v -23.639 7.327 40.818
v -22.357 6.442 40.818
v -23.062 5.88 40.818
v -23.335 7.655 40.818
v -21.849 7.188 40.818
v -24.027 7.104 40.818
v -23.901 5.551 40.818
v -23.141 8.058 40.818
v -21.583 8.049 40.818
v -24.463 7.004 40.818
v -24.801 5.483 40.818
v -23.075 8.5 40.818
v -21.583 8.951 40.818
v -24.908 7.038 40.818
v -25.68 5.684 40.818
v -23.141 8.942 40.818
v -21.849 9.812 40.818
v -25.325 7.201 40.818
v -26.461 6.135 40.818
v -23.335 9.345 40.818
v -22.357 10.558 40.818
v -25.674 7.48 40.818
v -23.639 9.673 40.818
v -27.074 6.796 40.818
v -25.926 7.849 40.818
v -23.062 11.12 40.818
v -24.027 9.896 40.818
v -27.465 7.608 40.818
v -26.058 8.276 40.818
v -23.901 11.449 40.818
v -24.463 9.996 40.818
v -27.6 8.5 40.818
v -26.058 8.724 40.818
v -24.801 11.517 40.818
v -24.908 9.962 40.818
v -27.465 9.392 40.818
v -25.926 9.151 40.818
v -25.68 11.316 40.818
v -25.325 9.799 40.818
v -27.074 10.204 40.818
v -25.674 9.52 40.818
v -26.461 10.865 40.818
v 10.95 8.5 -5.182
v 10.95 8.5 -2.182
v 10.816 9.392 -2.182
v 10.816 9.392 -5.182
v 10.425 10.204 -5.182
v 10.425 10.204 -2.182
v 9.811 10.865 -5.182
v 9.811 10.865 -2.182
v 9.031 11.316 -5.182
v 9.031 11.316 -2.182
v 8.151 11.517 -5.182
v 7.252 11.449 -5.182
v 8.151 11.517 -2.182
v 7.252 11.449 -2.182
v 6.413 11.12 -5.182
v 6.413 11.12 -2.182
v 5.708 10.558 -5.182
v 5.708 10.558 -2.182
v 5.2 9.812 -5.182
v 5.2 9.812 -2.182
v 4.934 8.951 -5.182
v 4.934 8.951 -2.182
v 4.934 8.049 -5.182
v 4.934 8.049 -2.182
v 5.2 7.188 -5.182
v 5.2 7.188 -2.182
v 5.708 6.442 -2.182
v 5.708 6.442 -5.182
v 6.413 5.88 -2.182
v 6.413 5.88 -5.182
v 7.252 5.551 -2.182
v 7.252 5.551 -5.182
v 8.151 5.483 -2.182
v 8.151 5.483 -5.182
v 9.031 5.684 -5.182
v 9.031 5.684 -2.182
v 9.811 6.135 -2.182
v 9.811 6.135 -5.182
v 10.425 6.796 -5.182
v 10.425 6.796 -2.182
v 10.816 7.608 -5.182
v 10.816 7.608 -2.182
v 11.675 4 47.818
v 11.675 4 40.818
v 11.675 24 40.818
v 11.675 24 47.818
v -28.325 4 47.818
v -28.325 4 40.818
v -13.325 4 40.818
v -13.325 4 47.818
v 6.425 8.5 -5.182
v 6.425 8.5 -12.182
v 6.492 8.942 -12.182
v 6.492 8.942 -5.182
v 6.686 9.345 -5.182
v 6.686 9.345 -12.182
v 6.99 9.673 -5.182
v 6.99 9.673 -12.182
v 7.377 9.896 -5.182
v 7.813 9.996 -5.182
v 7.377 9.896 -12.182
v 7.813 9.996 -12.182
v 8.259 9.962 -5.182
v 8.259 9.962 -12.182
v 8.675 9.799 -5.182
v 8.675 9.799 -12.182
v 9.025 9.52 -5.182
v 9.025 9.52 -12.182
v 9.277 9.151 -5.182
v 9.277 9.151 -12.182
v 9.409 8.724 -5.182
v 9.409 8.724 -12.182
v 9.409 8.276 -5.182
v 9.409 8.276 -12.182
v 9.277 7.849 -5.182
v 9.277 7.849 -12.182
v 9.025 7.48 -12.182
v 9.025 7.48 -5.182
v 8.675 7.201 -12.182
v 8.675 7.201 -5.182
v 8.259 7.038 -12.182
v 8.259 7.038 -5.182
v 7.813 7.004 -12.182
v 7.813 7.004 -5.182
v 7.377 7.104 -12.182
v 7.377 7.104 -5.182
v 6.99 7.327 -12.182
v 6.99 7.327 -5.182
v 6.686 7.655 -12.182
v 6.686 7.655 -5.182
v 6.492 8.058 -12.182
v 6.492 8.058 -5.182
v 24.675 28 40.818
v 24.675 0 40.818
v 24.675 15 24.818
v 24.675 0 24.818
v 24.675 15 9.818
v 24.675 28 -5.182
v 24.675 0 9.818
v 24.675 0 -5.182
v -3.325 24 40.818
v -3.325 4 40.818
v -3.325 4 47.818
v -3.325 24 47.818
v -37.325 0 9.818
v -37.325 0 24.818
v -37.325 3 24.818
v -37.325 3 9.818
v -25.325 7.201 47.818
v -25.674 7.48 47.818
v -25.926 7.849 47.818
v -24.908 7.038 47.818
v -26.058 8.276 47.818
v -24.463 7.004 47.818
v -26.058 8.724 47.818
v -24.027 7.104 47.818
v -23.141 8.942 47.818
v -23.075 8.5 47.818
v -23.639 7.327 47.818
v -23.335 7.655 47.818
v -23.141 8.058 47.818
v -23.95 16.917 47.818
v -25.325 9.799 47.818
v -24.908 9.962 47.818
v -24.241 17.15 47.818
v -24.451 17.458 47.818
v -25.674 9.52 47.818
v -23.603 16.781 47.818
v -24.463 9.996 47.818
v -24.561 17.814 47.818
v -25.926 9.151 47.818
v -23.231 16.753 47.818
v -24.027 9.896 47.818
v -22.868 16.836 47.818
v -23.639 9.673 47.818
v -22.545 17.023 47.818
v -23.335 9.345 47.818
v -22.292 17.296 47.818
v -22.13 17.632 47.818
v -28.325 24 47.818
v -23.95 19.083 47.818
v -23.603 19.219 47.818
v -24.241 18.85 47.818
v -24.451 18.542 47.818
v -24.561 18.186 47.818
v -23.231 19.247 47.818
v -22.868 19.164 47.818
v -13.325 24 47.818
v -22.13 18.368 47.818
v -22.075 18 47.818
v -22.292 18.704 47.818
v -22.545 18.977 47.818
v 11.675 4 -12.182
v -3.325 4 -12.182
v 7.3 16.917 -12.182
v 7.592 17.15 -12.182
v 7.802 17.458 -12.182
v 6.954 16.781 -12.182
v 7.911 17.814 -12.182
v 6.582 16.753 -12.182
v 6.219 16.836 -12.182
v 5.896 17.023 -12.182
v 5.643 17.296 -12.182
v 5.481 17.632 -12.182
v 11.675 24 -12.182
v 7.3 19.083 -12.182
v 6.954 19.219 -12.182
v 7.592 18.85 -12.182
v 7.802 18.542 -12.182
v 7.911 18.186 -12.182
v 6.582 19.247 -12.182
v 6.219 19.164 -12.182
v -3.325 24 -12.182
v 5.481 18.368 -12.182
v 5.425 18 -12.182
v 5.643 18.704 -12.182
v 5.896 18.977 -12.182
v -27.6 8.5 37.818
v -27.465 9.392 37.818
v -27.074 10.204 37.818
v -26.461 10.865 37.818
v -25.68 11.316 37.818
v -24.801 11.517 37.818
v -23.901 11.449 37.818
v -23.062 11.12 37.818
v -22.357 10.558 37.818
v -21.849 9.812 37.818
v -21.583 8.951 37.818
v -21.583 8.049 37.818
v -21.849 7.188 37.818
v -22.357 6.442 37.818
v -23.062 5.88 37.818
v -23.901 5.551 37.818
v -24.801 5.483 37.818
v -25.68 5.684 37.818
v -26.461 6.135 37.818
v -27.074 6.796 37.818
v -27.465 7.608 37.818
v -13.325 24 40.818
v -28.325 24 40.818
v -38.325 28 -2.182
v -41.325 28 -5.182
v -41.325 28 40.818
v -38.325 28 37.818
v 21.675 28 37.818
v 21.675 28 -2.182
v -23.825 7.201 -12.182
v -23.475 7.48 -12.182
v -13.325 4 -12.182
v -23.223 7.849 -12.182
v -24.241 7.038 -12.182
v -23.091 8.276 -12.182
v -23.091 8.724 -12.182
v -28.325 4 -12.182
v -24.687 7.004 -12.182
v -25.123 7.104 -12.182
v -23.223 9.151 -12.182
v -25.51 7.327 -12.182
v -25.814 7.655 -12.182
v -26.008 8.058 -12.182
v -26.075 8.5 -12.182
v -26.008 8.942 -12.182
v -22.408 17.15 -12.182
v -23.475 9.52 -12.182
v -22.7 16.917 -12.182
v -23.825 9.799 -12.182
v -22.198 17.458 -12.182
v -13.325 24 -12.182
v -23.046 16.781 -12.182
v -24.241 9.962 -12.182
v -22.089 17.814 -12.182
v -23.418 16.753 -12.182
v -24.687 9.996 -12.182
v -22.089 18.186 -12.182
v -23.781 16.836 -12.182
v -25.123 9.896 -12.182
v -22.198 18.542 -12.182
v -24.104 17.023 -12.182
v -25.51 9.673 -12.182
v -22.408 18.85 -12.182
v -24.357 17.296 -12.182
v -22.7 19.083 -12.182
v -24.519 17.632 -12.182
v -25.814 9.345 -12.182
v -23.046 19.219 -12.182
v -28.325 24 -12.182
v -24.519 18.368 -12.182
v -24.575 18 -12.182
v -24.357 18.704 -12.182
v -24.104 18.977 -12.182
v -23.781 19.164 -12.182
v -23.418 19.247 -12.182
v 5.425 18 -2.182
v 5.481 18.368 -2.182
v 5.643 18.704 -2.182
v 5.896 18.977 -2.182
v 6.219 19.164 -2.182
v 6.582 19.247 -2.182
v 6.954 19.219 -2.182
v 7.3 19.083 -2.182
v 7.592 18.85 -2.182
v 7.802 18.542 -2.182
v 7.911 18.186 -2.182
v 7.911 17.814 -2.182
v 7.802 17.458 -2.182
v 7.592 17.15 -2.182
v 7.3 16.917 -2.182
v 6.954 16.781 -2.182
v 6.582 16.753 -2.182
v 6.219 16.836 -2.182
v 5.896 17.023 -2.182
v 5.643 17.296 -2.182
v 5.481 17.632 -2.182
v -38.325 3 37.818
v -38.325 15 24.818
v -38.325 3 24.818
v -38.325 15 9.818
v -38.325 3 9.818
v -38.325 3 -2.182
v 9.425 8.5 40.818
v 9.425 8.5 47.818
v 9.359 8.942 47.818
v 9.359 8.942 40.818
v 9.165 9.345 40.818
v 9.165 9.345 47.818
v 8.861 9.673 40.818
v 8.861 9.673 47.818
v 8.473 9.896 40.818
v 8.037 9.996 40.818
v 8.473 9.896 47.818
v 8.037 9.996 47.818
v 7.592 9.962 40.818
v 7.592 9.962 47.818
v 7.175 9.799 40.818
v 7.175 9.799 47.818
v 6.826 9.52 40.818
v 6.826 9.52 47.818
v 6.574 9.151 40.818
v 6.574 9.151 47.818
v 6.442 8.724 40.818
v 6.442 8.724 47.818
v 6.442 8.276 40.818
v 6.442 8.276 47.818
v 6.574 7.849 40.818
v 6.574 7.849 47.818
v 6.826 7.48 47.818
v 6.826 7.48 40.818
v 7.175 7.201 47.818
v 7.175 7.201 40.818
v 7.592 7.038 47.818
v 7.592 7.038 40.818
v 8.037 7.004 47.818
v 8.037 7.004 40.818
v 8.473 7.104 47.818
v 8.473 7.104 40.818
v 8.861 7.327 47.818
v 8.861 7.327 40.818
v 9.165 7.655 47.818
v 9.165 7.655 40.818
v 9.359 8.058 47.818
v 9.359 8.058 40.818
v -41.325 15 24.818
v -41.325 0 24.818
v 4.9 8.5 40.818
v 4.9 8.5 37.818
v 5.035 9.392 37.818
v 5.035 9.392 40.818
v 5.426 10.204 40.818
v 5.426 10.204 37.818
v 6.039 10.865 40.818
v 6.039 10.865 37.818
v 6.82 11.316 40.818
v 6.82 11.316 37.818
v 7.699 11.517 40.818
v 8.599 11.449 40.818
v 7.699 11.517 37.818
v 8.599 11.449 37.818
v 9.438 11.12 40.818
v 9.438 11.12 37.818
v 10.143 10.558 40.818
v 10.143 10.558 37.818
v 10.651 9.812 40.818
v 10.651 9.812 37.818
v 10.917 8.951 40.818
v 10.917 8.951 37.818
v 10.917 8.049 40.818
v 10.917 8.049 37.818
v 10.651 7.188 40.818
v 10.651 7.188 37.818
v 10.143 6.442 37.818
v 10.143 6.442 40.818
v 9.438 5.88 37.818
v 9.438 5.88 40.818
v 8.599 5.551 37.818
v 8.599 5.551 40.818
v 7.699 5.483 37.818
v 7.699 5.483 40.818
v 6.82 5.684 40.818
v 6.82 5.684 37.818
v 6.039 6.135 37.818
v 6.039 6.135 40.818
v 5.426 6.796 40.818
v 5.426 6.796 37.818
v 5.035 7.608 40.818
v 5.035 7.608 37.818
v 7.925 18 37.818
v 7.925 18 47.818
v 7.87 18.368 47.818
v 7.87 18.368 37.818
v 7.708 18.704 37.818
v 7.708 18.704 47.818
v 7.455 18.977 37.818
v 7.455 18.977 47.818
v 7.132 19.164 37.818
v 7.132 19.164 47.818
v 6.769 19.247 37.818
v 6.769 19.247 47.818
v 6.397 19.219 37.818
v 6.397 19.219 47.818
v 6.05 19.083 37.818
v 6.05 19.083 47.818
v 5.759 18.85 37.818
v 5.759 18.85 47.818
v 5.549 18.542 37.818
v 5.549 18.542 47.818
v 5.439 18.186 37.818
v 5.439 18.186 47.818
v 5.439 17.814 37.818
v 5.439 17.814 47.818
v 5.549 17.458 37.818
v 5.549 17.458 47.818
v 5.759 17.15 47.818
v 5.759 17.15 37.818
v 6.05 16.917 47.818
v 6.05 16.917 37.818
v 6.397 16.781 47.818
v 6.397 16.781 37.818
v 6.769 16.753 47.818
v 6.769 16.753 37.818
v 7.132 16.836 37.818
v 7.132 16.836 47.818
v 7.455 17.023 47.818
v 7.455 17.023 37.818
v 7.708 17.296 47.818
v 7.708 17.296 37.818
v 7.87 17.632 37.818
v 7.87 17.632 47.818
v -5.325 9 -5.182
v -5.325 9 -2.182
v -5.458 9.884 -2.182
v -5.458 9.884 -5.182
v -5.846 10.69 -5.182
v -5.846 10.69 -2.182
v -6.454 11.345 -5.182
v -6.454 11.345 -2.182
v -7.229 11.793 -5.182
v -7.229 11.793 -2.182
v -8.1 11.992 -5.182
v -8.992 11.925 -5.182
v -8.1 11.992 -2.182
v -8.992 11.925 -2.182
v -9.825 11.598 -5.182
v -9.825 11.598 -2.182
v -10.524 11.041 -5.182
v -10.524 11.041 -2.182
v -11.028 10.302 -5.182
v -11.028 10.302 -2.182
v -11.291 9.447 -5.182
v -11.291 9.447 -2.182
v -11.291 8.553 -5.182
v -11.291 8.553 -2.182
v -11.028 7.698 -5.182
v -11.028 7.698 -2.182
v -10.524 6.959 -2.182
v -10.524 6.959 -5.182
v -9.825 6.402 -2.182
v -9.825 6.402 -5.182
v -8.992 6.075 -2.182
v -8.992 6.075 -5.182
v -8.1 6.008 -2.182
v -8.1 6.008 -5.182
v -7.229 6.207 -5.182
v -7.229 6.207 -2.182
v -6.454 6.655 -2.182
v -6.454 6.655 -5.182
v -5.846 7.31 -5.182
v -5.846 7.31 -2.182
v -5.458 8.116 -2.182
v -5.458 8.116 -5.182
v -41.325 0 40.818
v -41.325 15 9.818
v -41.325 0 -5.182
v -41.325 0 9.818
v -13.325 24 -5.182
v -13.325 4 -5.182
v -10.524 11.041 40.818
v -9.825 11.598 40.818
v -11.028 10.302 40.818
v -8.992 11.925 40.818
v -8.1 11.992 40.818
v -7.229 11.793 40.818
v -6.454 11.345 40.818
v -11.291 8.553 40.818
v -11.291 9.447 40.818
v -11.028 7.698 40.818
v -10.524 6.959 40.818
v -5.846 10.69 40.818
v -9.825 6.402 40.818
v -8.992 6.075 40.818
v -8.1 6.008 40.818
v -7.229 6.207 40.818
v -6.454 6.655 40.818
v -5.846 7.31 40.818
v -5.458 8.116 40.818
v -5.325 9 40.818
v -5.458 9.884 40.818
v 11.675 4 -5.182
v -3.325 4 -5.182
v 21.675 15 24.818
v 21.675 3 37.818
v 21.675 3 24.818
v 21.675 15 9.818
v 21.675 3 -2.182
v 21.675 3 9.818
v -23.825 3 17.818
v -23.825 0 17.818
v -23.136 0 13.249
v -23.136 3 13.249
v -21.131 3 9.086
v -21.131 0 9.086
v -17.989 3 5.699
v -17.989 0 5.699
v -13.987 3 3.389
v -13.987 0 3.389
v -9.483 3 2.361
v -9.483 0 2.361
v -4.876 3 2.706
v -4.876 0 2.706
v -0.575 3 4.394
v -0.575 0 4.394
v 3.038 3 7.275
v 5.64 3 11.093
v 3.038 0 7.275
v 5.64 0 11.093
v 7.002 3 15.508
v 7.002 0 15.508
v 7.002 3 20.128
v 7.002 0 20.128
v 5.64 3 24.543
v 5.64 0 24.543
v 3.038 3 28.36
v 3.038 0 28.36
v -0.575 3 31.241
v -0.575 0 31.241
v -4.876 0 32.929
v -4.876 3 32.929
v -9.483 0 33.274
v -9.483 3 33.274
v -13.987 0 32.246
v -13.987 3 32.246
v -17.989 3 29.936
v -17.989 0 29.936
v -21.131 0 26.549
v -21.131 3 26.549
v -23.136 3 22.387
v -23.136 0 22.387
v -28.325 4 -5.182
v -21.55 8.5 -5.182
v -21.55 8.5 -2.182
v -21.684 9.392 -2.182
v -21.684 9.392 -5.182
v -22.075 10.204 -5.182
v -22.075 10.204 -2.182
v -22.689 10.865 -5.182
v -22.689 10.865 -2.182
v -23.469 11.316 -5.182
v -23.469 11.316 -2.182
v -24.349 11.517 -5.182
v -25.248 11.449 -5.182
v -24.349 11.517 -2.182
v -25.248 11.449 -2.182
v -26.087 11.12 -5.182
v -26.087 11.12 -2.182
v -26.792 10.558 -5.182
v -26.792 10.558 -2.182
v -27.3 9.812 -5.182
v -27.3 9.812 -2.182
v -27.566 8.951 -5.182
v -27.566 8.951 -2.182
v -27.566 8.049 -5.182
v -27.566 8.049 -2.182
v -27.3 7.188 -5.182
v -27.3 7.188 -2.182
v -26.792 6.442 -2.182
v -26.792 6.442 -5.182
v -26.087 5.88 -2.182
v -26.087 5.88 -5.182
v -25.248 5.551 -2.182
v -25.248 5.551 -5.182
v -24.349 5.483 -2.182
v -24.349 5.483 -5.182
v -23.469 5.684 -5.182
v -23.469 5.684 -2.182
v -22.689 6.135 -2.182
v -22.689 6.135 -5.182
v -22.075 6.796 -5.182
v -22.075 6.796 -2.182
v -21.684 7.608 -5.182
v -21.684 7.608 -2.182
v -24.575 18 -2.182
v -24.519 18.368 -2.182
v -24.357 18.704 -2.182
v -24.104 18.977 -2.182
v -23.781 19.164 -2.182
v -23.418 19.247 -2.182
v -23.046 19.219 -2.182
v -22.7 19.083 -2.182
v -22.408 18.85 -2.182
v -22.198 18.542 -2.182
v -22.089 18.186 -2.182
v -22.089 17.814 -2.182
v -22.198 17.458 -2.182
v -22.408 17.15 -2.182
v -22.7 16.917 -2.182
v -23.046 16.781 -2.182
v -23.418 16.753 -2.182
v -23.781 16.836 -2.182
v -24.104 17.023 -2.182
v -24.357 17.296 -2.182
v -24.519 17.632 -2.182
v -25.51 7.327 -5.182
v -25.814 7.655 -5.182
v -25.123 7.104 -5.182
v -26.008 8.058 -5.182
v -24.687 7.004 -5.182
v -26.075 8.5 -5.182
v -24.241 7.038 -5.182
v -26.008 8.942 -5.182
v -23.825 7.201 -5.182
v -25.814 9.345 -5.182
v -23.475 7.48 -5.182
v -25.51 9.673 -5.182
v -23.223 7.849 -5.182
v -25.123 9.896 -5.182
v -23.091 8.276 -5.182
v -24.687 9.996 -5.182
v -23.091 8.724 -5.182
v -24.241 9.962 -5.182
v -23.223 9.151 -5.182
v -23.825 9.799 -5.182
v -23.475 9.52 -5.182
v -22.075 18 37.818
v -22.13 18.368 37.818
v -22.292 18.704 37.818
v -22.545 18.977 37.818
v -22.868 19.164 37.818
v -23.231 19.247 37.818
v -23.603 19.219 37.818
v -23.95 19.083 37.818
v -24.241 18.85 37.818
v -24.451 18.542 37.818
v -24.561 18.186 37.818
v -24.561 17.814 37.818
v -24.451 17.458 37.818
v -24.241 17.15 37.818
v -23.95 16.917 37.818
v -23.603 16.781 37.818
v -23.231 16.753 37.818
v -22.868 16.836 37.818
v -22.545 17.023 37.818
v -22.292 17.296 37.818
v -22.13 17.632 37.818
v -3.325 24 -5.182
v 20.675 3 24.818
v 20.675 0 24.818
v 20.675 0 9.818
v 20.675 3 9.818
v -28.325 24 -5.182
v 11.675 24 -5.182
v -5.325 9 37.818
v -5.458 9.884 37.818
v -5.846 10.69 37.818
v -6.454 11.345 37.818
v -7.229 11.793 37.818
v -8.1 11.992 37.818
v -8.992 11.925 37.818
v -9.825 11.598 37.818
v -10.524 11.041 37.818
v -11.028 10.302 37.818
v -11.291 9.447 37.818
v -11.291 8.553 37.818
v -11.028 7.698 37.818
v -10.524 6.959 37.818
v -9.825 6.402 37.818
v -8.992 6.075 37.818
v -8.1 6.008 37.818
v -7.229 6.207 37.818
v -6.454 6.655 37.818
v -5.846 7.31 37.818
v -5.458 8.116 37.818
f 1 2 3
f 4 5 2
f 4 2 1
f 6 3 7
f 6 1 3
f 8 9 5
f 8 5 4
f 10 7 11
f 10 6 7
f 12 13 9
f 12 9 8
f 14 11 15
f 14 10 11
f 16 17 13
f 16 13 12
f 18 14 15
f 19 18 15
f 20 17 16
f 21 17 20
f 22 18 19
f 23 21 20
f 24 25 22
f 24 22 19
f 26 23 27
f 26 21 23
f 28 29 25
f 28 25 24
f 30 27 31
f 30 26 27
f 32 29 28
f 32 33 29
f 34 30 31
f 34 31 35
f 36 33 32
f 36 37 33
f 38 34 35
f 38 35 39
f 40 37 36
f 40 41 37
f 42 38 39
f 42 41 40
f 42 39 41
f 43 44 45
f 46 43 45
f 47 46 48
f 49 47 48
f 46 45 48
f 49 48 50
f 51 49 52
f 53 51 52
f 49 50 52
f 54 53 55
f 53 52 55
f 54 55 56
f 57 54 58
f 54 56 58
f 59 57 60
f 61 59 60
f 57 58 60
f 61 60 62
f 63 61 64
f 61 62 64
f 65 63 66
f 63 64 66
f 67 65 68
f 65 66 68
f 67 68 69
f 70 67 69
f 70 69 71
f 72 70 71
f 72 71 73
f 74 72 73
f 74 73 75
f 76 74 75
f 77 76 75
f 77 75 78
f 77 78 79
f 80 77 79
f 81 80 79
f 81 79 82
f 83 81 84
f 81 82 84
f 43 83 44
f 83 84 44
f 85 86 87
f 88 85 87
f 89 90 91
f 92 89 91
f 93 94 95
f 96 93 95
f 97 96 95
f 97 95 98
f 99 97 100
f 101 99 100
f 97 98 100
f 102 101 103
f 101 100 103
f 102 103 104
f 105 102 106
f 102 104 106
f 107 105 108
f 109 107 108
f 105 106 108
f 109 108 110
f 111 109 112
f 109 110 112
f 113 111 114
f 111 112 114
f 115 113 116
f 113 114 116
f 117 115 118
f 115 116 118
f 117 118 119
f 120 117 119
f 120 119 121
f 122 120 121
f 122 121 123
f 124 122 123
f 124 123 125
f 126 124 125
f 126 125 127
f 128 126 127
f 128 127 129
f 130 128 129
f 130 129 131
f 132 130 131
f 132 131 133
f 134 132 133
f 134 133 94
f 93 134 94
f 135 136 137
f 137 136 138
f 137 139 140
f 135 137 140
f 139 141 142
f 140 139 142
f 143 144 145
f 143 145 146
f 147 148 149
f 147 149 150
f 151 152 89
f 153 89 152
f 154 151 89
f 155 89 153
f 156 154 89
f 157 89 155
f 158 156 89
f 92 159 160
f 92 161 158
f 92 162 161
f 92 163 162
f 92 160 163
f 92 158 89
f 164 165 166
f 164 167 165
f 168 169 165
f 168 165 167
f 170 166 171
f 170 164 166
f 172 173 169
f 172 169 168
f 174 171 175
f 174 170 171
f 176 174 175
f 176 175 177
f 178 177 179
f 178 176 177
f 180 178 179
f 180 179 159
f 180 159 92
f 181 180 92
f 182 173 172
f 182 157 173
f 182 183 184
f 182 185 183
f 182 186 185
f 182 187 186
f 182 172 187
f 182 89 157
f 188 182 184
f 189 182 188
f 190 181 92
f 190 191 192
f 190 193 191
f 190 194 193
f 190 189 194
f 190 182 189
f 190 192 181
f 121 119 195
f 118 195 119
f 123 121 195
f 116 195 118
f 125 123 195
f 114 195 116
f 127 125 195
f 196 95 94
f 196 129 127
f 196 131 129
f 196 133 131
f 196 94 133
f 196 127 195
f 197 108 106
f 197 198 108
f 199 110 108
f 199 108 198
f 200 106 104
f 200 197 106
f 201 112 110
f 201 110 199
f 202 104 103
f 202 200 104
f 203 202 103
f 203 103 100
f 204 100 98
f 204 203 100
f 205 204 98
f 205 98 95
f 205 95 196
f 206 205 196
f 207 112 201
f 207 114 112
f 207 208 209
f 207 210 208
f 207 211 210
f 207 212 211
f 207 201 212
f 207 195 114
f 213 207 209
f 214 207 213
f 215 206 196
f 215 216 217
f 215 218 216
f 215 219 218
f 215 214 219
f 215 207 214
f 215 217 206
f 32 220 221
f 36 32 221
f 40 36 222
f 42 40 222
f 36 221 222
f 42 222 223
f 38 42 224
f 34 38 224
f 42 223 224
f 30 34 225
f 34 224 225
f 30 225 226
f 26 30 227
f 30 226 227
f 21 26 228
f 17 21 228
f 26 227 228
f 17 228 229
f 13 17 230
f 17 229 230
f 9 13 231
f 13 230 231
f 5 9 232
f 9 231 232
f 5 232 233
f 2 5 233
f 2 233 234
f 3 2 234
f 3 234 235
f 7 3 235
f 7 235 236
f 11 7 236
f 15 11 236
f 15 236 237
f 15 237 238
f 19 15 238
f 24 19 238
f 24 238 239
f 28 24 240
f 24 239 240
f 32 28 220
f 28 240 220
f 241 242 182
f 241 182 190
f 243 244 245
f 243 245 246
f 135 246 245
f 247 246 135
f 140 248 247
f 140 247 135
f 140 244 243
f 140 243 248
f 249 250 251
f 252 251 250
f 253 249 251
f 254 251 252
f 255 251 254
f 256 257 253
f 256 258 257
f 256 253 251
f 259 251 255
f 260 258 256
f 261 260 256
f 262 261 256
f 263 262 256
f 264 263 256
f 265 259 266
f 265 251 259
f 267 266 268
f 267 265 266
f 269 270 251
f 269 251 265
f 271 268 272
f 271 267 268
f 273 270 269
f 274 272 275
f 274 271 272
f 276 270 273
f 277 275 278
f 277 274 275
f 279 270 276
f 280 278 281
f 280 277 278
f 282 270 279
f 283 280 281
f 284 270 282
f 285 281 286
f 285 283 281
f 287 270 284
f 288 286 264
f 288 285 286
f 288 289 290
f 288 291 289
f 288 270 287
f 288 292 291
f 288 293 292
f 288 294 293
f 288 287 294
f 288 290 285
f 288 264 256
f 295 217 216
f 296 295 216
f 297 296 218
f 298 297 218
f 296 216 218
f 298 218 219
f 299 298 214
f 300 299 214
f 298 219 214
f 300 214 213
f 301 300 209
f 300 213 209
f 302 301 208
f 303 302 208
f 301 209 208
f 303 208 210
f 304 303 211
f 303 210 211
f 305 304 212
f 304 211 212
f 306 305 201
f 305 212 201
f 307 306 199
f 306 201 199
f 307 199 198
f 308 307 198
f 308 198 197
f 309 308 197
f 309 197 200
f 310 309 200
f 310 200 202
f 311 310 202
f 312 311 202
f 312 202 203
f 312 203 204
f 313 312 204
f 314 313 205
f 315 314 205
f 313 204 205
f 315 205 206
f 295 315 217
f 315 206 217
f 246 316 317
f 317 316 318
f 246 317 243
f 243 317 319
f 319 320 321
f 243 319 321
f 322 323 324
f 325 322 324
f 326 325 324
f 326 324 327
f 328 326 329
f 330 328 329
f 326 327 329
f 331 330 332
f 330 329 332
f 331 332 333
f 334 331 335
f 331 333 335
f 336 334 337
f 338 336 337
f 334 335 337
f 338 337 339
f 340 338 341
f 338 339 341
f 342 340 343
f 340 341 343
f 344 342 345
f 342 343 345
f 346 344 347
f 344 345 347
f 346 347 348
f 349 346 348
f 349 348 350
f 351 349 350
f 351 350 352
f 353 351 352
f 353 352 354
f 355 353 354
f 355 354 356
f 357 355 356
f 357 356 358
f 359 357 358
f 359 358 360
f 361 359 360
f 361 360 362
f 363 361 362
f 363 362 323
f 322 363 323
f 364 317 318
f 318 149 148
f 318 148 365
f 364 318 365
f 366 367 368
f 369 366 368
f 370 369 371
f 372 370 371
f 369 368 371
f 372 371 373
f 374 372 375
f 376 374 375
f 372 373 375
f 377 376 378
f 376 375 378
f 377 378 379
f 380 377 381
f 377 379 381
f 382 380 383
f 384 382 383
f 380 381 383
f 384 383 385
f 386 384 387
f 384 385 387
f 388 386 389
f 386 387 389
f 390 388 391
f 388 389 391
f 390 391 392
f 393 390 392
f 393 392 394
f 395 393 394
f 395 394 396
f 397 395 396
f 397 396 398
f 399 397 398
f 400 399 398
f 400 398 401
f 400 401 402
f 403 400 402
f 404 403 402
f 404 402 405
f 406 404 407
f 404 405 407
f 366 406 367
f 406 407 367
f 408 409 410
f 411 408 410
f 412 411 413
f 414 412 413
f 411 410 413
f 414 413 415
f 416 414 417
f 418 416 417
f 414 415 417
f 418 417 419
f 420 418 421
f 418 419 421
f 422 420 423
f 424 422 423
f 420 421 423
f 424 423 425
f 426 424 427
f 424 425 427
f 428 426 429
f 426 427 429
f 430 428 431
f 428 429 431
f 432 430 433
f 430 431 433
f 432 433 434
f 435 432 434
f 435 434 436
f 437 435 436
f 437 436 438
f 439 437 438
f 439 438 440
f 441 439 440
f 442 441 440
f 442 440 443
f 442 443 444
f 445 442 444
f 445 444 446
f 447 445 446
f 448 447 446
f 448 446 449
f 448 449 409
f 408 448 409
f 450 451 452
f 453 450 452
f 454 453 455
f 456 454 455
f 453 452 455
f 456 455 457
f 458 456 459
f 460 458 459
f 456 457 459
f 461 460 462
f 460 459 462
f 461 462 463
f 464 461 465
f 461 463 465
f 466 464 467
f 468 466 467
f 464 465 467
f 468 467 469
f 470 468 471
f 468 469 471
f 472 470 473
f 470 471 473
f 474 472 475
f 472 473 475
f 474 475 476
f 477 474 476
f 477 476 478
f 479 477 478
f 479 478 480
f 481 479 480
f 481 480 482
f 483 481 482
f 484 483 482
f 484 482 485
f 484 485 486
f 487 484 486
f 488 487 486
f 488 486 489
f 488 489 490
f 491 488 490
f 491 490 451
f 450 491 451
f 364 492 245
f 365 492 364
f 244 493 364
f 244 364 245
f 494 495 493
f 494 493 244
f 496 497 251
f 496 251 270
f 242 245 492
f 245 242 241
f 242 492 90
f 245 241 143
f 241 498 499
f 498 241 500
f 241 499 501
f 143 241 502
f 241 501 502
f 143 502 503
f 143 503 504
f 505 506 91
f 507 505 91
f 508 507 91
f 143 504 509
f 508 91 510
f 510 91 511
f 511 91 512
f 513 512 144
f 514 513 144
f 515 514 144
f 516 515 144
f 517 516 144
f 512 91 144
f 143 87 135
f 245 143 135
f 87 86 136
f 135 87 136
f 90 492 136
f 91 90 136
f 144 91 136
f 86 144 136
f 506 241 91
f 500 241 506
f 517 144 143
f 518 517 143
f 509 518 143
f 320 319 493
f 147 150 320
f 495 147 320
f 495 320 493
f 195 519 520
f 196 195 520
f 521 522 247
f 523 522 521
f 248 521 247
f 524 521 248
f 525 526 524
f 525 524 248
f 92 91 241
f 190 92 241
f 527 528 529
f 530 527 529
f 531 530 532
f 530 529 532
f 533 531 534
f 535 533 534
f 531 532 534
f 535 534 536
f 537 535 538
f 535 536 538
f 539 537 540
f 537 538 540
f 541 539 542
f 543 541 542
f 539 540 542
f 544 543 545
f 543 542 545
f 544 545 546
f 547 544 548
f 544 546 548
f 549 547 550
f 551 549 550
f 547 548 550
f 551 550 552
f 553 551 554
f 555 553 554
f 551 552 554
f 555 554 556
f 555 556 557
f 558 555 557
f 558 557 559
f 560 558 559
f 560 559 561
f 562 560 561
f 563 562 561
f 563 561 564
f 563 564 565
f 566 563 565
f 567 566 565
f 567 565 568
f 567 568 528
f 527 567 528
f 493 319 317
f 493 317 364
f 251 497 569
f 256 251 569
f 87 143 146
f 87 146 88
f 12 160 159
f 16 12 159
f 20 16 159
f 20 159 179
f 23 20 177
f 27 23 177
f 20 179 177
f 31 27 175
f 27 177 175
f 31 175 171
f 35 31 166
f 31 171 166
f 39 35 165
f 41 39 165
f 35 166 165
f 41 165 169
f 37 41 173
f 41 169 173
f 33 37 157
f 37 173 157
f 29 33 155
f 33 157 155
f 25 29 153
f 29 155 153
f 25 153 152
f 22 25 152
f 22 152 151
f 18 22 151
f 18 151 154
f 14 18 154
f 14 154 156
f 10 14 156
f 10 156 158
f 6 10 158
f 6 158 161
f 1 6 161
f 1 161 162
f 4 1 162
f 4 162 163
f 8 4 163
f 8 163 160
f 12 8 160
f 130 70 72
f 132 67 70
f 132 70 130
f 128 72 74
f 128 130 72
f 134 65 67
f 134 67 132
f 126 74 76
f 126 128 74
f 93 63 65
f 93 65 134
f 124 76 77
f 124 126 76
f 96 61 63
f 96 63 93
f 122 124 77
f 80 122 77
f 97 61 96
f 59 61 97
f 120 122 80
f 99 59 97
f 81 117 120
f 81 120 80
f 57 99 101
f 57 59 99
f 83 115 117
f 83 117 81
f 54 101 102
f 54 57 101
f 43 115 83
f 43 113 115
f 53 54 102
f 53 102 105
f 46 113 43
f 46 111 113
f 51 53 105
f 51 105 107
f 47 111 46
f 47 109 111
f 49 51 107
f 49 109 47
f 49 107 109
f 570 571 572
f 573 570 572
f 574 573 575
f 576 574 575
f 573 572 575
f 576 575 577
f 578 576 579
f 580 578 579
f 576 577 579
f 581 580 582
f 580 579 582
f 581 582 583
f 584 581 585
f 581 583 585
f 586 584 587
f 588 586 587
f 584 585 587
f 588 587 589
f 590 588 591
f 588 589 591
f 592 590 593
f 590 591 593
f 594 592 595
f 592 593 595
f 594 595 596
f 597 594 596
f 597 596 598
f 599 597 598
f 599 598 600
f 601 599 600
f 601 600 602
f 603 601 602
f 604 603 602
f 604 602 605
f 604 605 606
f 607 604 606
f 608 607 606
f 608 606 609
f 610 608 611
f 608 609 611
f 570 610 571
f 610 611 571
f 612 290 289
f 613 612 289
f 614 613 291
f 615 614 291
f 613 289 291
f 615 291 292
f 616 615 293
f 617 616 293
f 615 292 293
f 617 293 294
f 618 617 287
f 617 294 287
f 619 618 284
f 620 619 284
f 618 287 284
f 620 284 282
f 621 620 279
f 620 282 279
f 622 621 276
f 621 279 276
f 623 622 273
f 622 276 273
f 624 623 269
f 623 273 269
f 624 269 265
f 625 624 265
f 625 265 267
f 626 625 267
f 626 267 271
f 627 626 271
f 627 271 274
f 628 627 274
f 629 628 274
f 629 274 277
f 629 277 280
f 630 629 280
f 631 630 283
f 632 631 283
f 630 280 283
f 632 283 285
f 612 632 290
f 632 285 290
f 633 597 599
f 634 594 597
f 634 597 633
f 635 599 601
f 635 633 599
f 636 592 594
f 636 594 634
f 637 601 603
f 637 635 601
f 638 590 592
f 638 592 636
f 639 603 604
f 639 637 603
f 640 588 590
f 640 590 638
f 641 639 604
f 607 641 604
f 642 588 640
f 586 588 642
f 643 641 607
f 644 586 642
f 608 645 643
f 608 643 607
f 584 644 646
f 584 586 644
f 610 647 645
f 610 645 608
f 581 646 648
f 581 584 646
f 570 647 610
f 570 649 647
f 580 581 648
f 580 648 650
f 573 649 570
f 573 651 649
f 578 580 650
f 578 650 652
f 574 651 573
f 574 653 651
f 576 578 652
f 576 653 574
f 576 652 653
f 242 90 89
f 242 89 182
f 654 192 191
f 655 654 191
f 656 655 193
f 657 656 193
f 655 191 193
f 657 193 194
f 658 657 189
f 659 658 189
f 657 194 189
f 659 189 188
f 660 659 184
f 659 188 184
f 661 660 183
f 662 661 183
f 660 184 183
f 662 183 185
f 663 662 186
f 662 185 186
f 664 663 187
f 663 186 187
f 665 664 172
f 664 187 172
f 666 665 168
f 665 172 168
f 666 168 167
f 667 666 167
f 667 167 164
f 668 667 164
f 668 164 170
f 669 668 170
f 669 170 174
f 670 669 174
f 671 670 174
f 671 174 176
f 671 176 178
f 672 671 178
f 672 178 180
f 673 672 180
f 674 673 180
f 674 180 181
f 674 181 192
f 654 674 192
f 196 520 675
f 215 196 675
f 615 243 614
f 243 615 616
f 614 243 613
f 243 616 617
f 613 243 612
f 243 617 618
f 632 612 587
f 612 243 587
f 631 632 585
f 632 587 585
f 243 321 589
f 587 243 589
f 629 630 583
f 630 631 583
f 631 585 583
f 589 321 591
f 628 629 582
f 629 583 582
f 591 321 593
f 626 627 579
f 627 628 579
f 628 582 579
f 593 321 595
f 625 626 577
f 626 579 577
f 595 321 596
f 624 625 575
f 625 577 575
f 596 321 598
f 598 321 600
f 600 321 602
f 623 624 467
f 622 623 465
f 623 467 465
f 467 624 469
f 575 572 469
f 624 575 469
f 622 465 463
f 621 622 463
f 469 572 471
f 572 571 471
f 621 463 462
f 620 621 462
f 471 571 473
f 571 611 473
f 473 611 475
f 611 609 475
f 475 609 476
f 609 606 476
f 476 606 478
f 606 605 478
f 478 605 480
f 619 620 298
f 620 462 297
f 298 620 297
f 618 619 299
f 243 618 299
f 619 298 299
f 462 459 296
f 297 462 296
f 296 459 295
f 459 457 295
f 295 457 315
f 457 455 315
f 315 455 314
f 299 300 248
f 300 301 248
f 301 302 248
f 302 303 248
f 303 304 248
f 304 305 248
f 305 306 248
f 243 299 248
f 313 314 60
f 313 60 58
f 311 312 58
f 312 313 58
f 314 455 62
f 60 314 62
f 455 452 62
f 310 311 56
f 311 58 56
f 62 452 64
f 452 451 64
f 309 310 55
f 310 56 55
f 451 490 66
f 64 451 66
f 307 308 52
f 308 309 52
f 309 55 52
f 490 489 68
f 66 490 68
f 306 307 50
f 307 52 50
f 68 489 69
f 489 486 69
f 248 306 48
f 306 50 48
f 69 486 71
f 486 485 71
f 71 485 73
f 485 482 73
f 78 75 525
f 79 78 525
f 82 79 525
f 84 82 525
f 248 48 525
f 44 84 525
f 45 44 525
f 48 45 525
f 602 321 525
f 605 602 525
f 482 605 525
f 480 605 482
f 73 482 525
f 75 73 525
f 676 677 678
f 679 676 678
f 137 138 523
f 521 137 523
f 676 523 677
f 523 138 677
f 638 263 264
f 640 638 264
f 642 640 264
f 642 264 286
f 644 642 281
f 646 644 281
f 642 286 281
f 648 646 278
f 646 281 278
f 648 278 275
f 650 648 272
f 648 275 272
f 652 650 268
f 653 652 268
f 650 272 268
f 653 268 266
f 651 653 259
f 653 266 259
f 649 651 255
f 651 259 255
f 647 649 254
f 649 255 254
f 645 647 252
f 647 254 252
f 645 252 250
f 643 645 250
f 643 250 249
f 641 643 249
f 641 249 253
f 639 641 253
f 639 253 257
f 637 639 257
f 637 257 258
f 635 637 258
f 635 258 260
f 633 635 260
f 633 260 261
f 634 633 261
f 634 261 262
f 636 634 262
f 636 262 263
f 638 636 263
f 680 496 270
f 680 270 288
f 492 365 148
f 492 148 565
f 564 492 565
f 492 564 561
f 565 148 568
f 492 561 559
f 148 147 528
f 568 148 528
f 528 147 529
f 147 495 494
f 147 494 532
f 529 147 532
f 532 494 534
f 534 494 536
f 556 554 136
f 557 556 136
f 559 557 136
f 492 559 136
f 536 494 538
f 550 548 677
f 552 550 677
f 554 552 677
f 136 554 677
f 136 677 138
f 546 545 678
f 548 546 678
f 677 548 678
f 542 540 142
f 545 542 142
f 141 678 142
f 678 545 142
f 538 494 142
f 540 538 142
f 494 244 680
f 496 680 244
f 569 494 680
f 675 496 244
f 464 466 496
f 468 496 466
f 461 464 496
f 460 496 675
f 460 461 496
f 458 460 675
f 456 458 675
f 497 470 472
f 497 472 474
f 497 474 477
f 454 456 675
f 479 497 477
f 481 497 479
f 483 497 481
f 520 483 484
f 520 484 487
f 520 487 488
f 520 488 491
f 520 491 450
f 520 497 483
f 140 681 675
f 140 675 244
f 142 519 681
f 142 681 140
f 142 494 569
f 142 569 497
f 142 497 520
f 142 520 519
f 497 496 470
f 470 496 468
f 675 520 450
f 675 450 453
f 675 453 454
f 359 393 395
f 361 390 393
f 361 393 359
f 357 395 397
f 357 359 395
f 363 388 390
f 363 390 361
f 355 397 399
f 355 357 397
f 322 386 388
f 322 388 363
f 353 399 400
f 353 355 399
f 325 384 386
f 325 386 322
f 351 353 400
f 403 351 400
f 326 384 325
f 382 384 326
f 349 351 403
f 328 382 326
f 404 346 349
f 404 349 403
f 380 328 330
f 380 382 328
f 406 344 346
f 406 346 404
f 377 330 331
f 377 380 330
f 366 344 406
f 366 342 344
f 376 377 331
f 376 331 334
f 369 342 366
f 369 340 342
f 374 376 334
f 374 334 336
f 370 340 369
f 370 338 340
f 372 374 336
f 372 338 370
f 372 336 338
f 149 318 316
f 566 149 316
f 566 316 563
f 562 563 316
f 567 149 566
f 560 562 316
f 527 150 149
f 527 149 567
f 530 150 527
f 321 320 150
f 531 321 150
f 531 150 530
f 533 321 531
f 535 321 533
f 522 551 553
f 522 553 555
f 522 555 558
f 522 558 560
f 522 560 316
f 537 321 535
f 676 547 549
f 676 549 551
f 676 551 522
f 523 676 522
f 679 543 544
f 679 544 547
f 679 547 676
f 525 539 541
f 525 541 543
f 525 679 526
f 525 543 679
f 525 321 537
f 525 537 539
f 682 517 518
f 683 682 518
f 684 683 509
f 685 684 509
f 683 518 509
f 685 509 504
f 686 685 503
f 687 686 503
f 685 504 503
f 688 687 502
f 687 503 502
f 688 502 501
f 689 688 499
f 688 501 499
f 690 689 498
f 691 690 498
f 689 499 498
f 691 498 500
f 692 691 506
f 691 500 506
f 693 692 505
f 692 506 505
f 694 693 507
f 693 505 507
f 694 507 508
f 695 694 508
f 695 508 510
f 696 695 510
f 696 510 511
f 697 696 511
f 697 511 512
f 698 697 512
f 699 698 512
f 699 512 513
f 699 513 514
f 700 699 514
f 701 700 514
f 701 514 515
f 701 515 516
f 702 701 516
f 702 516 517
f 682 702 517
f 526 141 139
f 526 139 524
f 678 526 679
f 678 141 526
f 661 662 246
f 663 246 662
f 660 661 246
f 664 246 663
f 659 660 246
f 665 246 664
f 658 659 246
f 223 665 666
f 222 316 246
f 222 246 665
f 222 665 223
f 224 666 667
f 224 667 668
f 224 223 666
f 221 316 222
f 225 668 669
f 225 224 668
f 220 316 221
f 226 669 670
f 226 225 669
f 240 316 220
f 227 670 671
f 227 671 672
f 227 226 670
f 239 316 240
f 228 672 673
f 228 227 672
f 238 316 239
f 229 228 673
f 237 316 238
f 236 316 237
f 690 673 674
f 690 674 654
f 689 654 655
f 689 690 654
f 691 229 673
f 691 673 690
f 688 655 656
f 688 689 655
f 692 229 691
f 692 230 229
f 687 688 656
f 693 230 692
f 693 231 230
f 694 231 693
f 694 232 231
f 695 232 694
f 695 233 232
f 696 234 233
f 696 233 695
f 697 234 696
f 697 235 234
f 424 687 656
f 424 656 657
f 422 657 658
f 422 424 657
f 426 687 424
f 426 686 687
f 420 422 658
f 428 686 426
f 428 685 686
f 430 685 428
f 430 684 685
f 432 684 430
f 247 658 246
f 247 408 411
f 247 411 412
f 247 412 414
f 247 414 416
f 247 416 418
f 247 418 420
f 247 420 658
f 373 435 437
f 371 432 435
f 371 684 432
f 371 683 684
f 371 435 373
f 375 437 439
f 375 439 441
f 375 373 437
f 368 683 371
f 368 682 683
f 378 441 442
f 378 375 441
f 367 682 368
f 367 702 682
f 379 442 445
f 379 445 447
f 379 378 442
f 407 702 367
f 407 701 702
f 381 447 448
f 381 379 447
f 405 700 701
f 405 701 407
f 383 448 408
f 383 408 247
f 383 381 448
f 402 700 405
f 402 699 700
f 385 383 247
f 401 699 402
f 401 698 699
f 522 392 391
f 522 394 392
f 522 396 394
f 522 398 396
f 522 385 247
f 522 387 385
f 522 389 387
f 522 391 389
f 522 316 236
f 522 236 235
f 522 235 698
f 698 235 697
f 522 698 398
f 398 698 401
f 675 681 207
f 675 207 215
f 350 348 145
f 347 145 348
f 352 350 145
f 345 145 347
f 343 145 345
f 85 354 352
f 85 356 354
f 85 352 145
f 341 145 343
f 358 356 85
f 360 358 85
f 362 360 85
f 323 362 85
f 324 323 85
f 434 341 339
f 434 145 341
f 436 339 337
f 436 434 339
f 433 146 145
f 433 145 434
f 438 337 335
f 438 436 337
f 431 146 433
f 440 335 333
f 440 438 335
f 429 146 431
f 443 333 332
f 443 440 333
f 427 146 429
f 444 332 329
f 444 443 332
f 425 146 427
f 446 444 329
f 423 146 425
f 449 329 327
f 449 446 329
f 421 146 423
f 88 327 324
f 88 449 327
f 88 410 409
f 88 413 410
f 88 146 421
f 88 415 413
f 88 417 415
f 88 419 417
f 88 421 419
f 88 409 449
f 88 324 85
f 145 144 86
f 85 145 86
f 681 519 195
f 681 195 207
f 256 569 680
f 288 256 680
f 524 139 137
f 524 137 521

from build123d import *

# Parameters (mm, degrees)
SKETCH1_W               = 66
SKETCH1_H               = 46
BOSS_EXTRUDE2_DEPTH     = 3
SKETCH3_W               = 66
SKETCH3_H               = 46
SKETCH3_W_2             = 60
SKETCH3_H_2             = 40
BOSS_EXTRUDE4_DEPTH     = 25
SKETCH4_W               = 15
SKETCH4_H               = 20
BOSS_EXTRUDE5_DEPTH     = 7
CUT_EXTRUDE1_REACH      = 55
SKETCH5_R               = 1.5
SKETCH5_R_2             = 1.25
SKETCH6_W               = 15
SKETCH6_H               = 20
BOSS_EXTRUDE6_DEPTH     = 7
SKETCH7_R               = 1.5
SKETCH7_R_2             = 1.25
CUT_EXTRUDE2_DEPTH      = 10
CUT_EXTRUDE3_REACH      = 30
SKETCH8_R               = 15.5
SKETCH11_R              = 3
CUT_EXTRUDE6_DEPTH      = 8
CUT_EXTRUDE6_DEPTH_BACK = 54
SKETCH12_R              = 3.025
CUT_EXTRUDE7_DEPTH      = 3
SKETCH14_R              = 3.025
CUT_EXTRUDE8_DEPTH      = 3
SKETCH15_W              = 4
SKETCH15_H              = 15
CUT_EXTRUDE10_DEPTH     = 15


with BuildPart() as part:
    # Sketch1 → Boss-Extrude2 (new body)
    with BuildSketch(Plane(origin=(0, 0, 0), x_dir=(1, 0, 0), z_dir=(0, 1, 0))):
        with Locations((-8.324615879, -17.817795916)):
            Rectangle(SKETCH1_W, SKETCH1_H)
    extrude(amount=BOSS_EXTRUDE2_DEPTH)

    # Sketch3 → Boss-Extrude4 (add)
    with BuildSketch(Plane(origin=(0, 3, 0), x_dir=(1, 0, 0), z_dir=(0, 1, 0))):
        with Locations((-8.324615879, -17.817795916)):
            Rectangle(SKETCH3_W, SKETCH3_H)
        with Locations((-8.324615879, -17.817795916)):
            Rectangle(SKETCH3_W_2, SKETCH3_H_2, mode=Mode.SUBTRACT)
    extrude(amount=BOSS_EXTRUDE4_DEPTH)

    # Sketch4 → Boss-Extrude5 (add)
    with BuildSketch(Plane.XY.offset(40.817795916)):
        with Locations((4.175384121, 14)):
            Rectangle(SKETCH4_W, SKETCH4_H)
        with Locations((-20.824615879, 14)):
            Rectangle(SKETCH4_W, SKETCH4_H)
    extrude(amount=BOSS_EXTRUDE5_DEPTH)

    # Sketch5 → Cut-Extrude1 (cut, up to next)
    with BuildSketch(Plane.XY.offset(47.817795916), mode=Mode.PRIVATE) as cut_extrude1_sk1:
        with Locations((-24.574615879, 8.5)):
            Circle(SKETCH5_R)
    cut_extrude1_tool1 = extrude(cut_extrude1_sk1.sketch, amount=-CUT_EXTRUDE1_REACH, mode=Mode.PRIVATE) & part.part
    add(cut_extrude1_tool1.solids().sort_by_distance((-24.574616, 8.5, 47.817796))[0], mode=Mode.SUBTRACT)
    # Sketch5 → Cut-Extrude1 (cut, up to next)
    with BuildSketch(Plane.XY.offset(47.817795916), mode=Mode.PRIVATE) as cut_extrude1_sk2:
        with Locations((7.925384121, 8.5)):
            Circle(SKETCH5_R)
    cut_extrude1_tool2 = extrude(cut_extrude1_sk2.sketch, amount=-CUT_EXTRUDE1_REACH, mode=Mode.PRIVATE) & part.part
    add(cut_extrude1_tool2.solids().sort_by_distance((7.925384, 8.5, 47.817796))[0], mode=Mode.SUBTRACT)
    # Sketch5 → Cut-Extrude1 (cut, up to next)
    with BuildSketch(Plane.XY.offset(47.817795916), mode=Mode.PRIVATE) as cut_extrude1_sk3:
        with Locations((6.675384121, 18)):
            Circle(SKETCH5_R_2)
    cut_extrude1_tool3 = extrude(cut_extrude1_sk3.sketch, amount=-CUT_EXTRUDE1_REACH, mode=Mode.PRIVATE) & part.part
    add(cut_extrude1_tool3.solids().sort_by_distance((6.675384, 18, 47.817796))[0], mode=Mode.SUBTRACT)
    # Sketch5 → Cut-Extrude1 (cut, up to next)
    with BuildSketch(Plane.XY.offset(47.817795916), mode=Mode.PRIVATE) as cut_extrude1_sk4:
        with Locations((-23.324615879, 18)):
            Circle(SKETCH5_R_2)
    cut_extrude1_tool4 = extrude(cut_extrude1_sk4.sketch, amount=-CUT_EXTRUDE1_REACH, mode=Mode.PRIVATE) & part.part
    add(cut_extrude1_tool4.solids().sort_by_distance((-23.324616, 18, 47.817796))[0], mode=Mode.SUBTRACT)

    # Sketch6 → Boss-Extrude6 (add)
    with BuildSketch(Plane(origin=(0, 0, -5.182204084), x_dir=(-1, 0, 0), z_dir=(0, 0, -1))):
        with Locations((-4.175384121, 14)):
            Rectangle(SKETCH6_W, SKETCH6_H)
        with Locations((20.824615879, 14)):
            Rectangle(SKETCH6_W, SKETCH6_H)
    extrude(amount=BOSS_EXTRUDE6_DEPTH)

    # Sketch7 → Cut-Extrude2 (cut)
    with BuildSketch(Plane(origin=(0, 0, -12.182204084), x_dir=(-1, 0, 0), z_dir=(0, 0, -1))):
        with Locations((-7.925384121, 8.5)):
            Circle(SKETCH7_R)
        with Locations((24.574615879, 8.5)):
            Circle(SKETCH7_R)
        with Locations((23.324615879, 18)):
            Circle(SKETCH7_R_2)
        with Locations((-6.675384121, 18)):
            Circle(SKETCH7_R_2)
    extrude(amount=-CUT_EXTRUDE2_DEPTH, mode=Mode.SUBTRACT)

    # Sketch8 → Cut-Extrude3 (cut, up to next)
    with BuildSketch(Plane(origin=(0, 0, 0), x_dir=(-1, 0, 0), z_dir=(0, -1, 0)), mode=Mode.PRIVATE) as cut_extrude3_sk1:
        with Locations((8.324615879, -17.817795916)):
            Circle(SKETCH8_R)
    cut_extrude3_tool1 = extrude(cut_extrude3_sk1.sketch, amount=-CUT_EXTRUDE3_REACH, mode=Mode.PRIVATE) & part.part
    add(cut_extrude3_tool1.solids().sort_by_distance((-8.324616, 0, 17.817796))[0], mode=Mode.SUBTRACT)

    # Sketch11 → Cut-Extrude6 (cut, two sides)
    with BuildSketch(Plane.XY.offset(40.817795916)) as cut_extrude6_sk:
        with Locations((-8.324615879, 9)):
            Circle(SKETCH11_R)
    extrude(amount=CUT_EXTRUDE6_DEPTH, mode=Mode.SUBTRACT)
    extrude(cut_extrude6_sk.sketch, amount=-CUT_EXTRUDE6_DEPTH_BACK, mode=Mode.SUBTRACT)

    # Sketch12 → Cut-Extrude7 (cut)
    with BuildSketch(Plane(origin=(0, 0, 37.817795916), x_dir=(-1, 0, 0), z_dir=(0, 0, -1))):
        with Locations((24.574615879, 8.5)):
            Circle(SKETCH12_R)
        with Locations((-7.925384121, 8.5)):
            Circle(SKETCH12_R)
    extrude(amount=-CUT_EXTRUDE7_DEPTH, mode=Mode.SUBTRACT)

    # Sketch14 → Cut-Extrude8 (cut)
    with BuildSketch(Plane.XY.offset(-2.182204084)):
        with Locations((-24.574615879, 8.5)):
            Circle(SKETCH14_R)
        with Locations((7.925384121, 8.5)):
            Circle(SKETCH14_R)
    extrude(amount=-CUT_EXTRUDE8_DEPTH, mode=Mode.SUBTRACT)

    # Sketch15 → Cut-Extrude10 (cut)
    with BuildSketch(Plane(origin=(0, 0, 0), x_dir=(-1, 0, 0), z_dir=(0, -1, 0))):
        with Locations((-22.675384121, -17.317795916)):
            Rectangle(SKETCH15_W, SKETCH15_H)
        with Locations((39.324615879, -17.317795916)):
            Rectangle(SKETCH15_W, SKETCH15_H)
    extrude(amount=-CUT_EXTRUDE10_DEPTH, mode=Mode.SUBTRACT)


solid = part.part
